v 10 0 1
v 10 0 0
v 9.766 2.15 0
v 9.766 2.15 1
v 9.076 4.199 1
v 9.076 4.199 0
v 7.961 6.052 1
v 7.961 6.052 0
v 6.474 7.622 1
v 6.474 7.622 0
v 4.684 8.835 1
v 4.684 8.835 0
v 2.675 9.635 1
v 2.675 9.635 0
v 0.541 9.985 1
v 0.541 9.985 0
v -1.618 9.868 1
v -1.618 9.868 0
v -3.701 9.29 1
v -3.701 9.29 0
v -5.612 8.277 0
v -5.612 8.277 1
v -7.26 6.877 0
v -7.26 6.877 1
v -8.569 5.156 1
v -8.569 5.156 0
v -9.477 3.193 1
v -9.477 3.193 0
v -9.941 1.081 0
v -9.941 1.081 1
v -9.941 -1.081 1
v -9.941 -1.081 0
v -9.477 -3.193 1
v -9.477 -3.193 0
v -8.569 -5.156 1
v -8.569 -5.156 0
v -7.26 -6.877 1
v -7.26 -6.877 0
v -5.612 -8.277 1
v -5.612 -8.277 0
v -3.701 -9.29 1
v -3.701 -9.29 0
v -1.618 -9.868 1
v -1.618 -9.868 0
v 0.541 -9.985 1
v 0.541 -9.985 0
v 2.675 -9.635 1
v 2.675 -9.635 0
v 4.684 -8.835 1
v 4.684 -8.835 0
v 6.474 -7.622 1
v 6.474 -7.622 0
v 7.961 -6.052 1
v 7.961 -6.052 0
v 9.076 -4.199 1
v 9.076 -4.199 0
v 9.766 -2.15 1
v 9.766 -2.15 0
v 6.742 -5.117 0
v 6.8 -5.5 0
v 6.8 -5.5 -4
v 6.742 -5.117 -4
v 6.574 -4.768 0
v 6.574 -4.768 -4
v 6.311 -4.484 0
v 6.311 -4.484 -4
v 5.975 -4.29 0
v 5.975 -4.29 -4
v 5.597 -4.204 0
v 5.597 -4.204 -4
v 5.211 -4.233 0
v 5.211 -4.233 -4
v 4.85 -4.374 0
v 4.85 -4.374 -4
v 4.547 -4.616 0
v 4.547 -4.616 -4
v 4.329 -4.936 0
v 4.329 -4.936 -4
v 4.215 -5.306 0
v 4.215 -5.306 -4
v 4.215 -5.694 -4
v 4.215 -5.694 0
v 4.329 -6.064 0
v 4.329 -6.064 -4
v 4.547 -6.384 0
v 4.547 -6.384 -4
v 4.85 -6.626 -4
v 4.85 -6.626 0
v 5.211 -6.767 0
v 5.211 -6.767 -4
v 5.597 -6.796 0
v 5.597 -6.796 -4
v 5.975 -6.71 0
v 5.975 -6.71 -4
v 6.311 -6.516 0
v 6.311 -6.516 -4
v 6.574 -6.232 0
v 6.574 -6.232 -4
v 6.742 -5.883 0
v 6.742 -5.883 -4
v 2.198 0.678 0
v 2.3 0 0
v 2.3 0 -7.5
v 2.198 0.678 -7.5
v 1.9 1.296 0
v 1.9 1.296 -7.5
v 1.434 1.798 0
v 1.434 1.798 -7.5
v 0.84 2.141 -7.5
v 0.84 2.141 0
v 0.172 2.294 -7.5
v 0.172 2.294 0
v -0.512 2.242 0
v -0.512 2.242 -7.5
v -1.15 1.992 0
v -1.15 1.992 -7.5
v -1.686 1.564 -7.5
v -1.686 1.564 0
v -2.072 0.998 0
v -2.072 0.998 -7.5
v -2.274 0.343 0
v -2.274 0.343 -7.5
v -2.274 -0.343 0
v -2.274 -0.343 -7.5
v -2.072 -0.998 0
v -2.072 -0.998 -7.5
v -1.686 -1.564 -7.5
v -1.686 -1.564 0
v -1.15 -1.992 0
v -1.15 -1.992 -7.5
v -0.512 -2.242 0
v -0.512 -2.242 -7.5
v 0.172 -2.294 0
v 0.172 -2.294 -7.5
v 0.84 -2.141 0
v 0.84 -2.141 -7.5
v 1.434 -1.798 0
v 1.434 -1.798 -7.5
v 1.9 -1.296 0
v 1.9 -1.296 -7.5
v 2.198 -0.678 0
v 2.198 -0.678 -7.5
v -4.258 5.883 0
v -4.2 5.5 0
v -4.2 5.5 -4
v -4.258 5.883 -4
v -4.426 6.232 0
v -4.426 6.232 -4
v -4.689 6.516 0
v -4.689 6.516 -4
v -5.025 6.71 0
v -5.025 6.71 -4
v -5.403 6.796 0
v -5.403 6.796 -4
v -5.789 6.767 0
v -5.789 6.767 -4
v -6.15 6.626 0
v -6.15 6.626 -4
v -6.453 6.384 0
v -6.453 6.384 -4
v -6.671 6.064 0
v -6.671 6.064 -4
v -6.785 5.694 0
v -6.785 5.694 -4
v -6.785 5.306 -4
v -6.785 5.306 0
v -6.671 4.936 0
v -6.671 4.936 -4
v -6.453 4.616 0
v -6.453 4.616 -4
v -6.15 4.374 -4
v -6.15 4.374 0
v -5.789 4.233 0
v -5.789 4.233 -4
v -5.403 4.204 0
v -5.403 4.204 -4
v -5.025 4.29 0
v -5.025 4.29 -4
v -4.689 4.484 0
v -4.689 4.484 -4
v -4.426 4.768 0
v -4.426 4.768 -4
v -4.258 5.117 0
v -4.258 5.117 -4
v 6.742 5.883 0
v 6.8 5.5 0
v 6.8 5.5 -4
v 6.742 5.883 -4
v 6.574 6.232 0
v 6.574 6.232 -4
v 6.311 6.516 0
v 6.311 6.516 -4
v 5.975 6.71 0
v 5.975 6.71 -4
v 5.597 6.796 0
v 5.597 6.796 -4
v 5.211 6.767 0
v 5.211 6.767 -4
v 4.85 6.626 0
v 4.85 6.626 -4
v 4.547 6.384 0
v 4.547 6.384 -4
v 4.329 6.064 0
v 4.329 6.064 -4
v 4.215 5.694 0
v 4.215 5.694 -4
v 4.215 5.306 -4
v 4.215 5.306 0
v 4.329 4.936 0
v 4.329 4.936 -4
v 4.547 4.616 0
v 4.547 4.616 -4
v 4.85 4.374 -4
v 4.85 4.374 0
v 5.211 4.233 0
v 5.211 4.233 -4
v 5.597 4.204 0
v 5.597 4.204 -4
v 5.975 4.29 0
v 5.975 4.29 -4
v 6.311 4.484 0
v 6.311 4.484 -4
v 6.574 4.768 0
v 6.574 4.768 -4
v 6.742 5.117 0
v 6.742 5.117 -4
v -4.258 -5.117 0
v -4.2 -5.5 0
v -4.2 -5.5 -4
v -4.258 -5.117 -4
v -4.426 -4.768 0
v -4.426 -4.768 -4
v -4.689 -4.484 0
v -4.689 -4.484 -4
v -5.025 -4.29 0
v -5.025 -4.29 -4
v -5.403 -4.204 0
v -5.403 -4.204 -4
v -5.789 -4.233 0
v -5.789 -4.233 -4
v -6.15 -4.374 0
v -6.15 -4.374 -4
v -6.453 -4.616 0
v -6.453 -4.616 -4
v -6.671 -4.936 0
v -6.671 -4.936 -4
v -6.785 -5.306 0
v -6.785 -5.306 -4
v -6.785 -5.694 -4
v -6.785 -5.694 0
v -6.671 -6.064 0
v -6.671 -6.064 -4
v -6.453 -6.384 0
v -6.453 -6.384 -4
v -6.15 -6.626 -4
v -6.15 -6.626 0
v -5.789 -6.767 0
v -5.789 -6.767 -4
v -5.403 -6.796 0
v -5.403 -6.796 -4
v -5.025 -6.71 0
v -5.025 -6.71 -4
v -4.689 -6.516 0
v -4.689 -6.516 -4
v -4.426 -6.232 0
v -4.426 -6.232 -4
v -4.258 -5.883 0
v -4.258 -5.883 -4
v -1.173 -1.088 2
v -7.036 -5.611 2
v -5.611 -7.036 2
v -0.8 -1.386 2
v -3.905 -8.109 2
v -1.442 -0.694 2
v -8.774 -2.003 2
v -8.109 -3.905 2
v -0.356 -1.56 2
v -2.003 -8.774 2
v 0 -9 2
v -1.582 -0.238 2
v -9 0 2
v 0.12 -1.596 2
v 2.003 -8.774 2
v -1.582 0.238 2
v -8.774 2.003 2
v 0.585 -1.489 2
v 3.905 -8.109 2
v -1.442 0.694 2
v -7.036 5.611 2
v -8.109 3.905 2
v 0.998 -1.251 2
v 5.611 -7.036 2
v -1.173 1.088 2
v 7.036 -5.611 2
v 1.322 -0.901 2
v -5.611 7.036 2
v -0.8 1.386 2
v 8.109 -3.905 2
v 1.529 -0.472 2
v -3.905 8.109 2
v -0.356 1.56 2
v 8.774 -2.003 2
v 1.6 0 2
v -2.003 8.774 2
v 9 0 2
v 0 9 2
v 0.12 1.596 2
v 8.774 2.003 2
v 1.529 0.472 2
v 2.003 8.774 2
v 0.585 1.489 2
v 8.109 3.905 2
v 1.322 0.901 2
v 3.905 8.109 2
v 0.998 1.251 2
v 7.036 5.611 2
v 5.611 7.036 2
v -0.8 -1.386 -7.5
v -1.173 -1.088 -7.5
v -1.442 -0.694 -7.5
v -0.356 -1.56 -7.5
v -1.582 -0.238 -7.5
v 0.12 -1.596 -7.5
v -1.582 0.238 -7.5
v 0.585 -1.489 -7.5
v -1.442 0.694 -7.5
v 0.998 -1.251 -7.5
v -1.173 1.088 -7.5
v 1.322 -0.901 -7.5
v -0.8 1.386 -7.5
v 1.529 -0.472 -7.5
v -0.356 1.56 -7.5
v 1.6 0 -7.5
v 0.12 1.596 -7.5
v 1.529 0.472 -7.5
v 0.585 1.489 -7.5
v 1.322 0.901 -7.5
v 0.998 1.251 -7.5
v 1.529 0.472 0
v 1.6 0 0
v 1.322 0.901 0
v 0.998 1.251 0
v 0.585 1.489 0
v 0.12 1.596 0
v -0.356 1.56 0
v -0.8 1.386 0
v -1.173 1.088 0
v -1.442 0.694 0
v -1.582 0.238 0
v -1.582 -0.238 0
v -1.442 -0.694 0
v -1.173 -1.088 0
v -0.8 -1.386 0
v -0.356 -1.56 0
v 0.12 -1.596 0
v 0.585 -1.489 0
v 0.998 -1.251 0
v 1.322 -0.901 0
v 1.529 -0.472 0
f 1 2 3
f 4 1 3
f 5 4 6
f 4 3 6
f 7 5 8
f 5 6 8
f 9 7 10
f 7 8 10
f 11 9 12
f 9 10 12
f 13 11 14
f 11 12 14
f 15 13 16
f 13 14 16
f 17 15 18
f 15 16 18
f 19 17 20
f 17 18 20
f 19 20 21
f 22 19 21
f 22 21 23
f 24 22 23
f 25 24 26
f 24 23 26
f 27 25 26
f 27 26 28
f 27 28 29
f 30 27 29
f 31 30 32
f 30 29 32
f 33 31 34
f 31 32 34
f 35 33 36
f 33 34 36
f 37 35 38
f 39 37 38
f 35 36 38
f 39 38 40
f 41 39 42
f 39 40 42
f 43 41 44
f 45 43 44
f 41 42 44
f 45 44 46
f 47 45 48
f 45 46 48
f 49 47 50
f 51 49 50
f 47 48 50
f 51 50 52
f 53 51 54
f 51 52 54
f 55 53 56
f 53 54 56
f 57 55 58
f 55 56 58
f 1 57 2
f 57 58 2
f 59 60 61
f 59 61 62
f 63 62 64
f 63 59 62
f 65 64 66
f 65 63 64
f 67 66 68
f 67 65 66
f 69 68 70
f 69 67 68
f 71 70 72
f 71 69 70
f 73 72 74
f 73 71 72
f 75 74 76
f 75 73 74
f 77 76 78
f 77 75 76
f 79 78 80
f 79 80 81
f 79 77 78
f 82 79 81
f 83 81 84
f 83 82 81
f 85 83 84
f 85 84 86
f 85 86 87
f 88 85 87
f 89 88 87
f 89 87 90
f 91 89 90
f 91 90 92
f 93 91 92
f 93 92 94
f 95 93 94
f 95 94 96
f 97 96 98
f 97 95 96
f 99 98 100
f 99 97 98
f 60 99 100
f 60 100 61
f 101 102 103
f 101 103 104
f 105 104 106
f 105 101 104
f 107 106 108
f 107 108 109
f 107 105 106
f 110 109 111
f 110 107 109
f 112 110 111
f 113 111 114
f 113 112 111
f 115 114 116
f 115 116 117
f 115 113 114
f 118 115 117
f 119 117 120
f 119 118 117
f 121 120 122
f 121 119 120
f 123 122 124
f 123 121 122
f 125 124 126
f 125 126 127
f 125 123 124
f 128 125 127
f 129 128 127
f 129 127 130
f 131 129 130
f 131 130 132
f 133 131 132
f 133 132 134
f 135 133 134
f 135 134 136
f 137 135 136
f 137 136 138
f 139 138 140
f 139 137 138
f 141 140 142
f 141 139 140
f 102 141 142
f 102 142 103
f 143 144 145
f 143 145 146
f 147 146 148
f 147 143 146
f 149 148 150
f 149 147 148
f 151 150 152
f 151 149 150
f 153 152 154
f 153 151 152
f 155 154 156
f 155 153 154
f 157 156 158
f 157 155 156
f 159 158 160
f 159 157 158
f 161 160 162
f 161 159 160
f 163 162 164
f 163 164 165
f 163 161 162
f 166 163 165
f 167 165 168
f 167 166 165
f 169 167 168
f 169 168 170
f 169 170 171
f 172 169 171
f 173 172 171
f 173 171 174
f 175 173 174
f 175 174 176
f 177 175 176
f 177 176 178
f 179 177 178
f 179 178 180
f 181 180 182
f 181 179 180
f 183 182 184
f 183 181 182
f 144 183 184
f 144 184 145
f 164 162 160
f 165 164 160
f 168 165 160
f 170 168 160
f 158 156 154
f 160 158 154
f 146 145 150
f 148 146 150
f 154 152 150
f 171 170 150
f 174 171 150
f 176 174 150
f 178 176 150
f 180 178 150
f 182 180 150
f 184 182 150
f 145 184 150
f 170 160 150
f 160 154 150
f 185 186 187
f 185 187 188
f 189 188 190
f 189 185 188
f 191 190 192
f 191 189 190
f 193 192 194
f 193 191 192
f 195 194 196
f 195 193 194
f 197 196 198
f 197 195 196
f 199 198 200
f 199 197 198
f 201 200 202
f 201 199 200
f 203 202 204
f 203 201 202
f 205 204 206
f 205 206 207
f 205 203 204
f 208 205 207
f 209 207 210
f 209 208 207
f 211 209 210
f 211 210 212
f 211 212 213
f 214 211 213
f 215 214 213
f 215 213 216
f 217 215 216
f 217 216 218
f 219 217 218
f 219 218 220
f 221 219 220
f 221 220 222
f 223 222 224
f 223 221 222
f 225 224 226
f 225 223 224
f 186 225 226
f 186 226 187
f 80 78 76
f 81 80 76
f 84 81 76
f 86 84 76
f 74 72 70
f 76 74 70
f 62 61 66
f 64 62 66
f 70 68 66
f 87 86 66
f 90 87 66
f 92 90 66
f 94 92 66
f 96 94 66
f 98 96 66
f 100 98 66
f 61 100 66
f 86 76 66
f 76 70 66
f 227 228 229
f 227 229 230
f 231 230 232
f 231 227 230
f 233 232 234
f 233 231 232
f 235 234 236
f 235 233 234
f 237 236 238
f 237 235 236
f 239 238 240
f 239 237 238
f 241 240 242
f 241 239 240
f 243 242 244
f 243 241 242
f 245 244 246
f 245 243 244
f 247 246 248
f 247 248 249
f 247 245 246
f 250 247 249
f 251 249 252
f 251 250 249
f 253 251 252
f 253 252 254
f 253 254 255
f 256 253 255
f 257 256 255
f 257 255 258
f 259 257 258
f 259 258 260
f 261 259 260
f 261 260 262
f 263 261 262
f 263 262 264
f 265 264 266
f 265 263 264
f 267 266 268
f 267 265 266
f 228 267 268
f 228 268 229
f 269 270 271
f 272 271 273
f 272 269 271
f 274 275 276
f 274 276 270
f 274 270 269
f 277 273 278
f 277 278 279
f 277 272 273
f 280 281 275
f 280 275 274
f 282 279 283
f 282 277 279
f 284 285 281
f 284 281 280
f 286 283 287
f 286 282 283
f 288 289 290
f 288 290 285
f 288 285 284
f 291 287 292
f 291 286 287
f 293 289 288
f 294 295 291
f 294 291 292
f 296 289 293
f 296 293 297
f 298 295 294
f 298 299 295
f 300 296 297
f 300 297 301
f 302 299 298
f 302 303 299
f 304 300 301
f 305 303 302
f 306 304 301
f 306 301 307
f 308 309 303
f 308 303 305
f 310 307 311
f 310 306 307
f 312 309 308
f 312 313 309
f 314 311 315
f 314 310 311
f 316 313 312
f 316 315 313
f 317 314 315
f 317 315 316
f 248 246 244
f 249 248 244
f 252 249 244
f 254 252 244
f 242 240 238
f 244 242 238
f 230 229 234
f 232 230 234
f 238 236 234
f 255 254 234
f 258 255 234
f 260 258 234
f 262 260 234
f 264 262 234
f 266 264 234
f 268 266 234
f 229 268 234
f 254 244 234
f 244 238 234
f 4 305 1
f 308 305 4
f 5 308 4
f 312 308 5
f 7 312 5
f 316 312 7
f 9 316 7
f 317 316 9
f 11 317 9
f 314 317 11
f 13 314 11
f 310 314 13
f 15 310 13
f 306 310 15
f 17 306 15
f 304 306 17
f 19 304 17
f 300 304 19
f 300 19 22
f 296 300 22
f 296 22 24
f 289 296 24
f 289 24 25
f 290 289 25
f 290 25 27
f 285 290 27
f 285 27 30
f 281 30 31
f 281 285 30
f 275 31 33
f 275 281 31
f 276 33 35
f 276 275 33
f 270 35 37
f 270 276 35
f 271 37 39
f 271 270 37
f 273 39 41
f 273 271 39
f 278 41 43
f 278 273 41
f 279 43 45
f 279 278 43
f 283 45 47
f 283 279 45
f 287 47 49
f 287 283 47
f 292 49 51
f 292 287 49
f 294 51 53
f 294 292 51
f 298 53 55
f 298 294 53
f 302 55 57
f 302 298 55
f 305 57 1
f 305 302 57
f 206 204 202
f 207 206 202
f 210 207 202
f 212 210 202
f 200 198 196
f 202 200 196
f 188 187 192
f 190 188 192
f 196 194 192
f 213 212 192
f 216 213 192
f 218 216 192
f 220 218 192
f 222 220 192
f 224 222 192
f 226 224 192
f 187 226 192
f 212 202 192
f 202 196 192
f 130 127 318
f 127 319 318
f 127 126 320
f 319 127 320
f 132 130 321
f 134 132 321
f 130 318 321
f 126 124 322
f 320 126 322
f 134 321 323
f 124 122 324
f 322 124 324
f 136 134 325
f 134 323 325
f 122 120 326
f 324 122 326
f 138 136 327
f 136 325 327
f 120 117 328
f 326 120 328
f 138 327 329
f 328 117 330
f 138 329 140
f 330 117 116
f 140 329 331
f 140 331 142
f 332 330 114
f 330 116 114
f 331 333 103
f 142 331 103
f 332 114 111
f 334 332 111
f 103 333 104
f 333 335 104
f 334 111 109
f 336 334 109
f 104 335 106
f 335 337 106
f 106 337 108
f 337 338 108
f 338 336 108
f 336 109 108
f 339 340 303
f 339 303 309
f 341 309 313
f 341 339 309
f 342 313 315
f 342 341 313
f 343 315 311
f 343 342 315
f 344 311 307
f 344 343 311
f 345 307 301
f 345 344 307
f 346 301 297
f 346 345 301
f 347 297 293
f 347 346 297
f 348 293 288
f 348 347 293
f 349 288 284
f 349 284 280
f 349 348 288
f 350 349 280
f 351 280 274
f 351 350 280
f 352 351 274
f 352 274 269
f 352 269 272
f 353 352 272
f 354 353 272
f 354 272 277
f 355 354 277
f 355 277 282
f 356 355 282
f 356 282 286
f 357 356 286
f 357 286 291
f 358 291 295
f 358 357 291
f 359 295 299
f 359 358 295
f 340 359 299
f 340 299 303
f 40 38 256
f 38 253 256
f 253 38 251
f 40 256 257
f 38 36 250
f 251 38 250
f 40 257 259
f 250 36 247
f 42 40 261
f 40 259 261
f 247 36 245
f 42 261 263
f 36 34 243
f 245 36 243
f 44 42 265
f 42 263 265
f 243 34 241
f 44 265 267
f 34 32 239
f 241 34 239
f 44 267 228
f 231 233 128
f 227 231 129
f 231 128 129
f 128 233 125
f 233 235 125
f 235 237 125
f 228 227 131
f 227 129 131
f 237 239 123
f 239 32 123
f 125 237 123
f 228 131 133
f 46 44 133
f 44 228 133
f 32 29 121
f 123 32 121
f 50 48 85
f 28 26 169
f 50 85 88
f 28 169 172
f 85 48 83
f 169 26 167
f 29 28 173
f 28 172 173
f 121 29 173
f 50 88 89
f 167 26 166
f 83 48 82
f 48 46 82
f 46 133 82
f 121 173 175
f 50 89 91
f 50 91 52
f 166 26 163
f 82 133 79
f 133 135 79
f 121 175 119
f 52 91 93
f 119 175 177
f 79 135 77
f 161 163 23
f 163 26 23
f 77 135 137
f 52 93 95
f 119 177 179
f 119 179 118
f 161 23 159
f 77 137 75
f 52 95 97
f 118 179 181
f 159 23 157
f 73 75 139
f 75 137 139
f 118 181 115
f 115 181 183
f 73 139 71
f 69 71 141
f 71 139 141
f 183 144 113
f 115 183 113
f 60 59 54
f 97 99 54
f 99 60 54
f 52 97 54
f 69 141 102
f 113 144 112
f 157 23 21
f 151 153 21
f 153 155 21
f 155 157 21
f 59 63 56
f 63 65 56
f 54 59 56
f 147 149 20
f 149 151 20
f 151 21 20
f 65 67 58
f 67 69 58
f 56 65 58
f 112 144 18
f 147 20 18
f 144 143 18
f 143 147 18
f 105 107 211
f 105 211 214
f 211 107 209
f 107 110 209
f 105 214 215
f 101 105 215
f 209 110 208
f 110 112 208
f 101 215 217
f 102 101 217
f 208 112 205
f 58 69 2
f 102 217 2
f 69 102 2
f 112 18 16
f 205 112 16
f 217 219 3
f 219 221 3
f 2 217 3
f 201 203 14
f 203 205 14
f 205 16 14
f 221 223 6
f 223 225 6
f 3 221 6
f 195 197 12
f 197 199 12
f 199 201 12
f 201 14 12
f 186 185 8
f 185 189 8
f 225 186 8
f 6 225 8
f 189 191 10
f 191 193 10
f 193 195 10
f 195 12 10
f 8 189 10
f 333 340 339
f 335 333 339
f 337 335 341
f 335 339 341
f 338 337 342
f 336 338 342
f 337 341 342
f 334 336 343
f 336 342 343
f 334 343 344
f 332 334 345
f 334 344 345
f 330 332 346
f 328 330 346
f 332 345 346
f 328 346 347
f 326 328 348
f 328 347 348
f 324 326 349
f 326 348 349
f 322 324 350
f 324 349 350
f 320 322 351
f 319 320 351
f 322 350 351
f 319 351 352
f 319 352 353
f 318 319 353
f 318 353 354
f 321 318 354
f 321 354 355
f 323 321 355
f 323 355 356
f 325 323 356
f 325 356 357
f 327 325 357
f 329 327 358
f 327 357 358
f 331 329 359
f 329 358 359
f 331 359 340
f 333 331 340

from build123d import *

# Parameters (mm, degrees)
SKETCH1_R           = 10
SKETCH1_R_2         = 1.6
BOSS_EXTRUDE1_DEPTH = 2
SKETCH1_3_R         = 1.3
BOSS_EXTRUDE2_DEPTH = 4
CHAMFER1_SIZE       = 1
BOSS_EXTRUDE4_START = -7.5
SKETCH1_5_R         = 2.3
SKETCH1_5_R_2       = 1.6
BOSS_EXTRUDE4_DEPTH = 7.5


with BuildPart() as part:
    # Sketch1 → Boss-Extrude1 (new body)
    with BuildSketch(Plane.XY):
        Circle(SKETCH1_R)
        Circle(SKETCH1_R_2, mode=Mode.SUBTRACT)
    extrude(amount=BOSS_EXTRUDE1_DEPTH)

    # Sketch1<3> → Boss-Extrude2 (add)
    with BuildSketch(Plane.XY):
        with Locations((5.5, 5.5)):
            Circle(SKETCH1_3_R)
        with Locations((5.5, -5.5)):
            Circle(SKETCH1_3_R)
        with Locations((-5.5, -5.5)):
            Circle(SKETCH1_3_R)
        with Locations((-5.5, 5.5)):
            Circle(SKETCH1_3_R)
    extrude(amount=-BOSS_EXTRUDE2_DEPTH)

    # Chamfer1
    chamfer1_edges = [part.edges().sort_by_distance(p)[0] for p in [
        (-10, 0, 2),
    ]]
    chamfer(chamfer1_edges, length=CHAMFER1_SIZE)

    # Sketch1<5> → Boss-Extrude4 (add)
    with BuildSketch(Plane.XY.offset(BOSS_EXTRUDE4_START)):
        Circle(SKETCH1_5_R)
        Circle(SKETCH1_5_R_2, mode=Mode.SUBTRACT)
    extrude(amount=BOSS_EXTRUDE4_DEPTH)


solid = part.part
